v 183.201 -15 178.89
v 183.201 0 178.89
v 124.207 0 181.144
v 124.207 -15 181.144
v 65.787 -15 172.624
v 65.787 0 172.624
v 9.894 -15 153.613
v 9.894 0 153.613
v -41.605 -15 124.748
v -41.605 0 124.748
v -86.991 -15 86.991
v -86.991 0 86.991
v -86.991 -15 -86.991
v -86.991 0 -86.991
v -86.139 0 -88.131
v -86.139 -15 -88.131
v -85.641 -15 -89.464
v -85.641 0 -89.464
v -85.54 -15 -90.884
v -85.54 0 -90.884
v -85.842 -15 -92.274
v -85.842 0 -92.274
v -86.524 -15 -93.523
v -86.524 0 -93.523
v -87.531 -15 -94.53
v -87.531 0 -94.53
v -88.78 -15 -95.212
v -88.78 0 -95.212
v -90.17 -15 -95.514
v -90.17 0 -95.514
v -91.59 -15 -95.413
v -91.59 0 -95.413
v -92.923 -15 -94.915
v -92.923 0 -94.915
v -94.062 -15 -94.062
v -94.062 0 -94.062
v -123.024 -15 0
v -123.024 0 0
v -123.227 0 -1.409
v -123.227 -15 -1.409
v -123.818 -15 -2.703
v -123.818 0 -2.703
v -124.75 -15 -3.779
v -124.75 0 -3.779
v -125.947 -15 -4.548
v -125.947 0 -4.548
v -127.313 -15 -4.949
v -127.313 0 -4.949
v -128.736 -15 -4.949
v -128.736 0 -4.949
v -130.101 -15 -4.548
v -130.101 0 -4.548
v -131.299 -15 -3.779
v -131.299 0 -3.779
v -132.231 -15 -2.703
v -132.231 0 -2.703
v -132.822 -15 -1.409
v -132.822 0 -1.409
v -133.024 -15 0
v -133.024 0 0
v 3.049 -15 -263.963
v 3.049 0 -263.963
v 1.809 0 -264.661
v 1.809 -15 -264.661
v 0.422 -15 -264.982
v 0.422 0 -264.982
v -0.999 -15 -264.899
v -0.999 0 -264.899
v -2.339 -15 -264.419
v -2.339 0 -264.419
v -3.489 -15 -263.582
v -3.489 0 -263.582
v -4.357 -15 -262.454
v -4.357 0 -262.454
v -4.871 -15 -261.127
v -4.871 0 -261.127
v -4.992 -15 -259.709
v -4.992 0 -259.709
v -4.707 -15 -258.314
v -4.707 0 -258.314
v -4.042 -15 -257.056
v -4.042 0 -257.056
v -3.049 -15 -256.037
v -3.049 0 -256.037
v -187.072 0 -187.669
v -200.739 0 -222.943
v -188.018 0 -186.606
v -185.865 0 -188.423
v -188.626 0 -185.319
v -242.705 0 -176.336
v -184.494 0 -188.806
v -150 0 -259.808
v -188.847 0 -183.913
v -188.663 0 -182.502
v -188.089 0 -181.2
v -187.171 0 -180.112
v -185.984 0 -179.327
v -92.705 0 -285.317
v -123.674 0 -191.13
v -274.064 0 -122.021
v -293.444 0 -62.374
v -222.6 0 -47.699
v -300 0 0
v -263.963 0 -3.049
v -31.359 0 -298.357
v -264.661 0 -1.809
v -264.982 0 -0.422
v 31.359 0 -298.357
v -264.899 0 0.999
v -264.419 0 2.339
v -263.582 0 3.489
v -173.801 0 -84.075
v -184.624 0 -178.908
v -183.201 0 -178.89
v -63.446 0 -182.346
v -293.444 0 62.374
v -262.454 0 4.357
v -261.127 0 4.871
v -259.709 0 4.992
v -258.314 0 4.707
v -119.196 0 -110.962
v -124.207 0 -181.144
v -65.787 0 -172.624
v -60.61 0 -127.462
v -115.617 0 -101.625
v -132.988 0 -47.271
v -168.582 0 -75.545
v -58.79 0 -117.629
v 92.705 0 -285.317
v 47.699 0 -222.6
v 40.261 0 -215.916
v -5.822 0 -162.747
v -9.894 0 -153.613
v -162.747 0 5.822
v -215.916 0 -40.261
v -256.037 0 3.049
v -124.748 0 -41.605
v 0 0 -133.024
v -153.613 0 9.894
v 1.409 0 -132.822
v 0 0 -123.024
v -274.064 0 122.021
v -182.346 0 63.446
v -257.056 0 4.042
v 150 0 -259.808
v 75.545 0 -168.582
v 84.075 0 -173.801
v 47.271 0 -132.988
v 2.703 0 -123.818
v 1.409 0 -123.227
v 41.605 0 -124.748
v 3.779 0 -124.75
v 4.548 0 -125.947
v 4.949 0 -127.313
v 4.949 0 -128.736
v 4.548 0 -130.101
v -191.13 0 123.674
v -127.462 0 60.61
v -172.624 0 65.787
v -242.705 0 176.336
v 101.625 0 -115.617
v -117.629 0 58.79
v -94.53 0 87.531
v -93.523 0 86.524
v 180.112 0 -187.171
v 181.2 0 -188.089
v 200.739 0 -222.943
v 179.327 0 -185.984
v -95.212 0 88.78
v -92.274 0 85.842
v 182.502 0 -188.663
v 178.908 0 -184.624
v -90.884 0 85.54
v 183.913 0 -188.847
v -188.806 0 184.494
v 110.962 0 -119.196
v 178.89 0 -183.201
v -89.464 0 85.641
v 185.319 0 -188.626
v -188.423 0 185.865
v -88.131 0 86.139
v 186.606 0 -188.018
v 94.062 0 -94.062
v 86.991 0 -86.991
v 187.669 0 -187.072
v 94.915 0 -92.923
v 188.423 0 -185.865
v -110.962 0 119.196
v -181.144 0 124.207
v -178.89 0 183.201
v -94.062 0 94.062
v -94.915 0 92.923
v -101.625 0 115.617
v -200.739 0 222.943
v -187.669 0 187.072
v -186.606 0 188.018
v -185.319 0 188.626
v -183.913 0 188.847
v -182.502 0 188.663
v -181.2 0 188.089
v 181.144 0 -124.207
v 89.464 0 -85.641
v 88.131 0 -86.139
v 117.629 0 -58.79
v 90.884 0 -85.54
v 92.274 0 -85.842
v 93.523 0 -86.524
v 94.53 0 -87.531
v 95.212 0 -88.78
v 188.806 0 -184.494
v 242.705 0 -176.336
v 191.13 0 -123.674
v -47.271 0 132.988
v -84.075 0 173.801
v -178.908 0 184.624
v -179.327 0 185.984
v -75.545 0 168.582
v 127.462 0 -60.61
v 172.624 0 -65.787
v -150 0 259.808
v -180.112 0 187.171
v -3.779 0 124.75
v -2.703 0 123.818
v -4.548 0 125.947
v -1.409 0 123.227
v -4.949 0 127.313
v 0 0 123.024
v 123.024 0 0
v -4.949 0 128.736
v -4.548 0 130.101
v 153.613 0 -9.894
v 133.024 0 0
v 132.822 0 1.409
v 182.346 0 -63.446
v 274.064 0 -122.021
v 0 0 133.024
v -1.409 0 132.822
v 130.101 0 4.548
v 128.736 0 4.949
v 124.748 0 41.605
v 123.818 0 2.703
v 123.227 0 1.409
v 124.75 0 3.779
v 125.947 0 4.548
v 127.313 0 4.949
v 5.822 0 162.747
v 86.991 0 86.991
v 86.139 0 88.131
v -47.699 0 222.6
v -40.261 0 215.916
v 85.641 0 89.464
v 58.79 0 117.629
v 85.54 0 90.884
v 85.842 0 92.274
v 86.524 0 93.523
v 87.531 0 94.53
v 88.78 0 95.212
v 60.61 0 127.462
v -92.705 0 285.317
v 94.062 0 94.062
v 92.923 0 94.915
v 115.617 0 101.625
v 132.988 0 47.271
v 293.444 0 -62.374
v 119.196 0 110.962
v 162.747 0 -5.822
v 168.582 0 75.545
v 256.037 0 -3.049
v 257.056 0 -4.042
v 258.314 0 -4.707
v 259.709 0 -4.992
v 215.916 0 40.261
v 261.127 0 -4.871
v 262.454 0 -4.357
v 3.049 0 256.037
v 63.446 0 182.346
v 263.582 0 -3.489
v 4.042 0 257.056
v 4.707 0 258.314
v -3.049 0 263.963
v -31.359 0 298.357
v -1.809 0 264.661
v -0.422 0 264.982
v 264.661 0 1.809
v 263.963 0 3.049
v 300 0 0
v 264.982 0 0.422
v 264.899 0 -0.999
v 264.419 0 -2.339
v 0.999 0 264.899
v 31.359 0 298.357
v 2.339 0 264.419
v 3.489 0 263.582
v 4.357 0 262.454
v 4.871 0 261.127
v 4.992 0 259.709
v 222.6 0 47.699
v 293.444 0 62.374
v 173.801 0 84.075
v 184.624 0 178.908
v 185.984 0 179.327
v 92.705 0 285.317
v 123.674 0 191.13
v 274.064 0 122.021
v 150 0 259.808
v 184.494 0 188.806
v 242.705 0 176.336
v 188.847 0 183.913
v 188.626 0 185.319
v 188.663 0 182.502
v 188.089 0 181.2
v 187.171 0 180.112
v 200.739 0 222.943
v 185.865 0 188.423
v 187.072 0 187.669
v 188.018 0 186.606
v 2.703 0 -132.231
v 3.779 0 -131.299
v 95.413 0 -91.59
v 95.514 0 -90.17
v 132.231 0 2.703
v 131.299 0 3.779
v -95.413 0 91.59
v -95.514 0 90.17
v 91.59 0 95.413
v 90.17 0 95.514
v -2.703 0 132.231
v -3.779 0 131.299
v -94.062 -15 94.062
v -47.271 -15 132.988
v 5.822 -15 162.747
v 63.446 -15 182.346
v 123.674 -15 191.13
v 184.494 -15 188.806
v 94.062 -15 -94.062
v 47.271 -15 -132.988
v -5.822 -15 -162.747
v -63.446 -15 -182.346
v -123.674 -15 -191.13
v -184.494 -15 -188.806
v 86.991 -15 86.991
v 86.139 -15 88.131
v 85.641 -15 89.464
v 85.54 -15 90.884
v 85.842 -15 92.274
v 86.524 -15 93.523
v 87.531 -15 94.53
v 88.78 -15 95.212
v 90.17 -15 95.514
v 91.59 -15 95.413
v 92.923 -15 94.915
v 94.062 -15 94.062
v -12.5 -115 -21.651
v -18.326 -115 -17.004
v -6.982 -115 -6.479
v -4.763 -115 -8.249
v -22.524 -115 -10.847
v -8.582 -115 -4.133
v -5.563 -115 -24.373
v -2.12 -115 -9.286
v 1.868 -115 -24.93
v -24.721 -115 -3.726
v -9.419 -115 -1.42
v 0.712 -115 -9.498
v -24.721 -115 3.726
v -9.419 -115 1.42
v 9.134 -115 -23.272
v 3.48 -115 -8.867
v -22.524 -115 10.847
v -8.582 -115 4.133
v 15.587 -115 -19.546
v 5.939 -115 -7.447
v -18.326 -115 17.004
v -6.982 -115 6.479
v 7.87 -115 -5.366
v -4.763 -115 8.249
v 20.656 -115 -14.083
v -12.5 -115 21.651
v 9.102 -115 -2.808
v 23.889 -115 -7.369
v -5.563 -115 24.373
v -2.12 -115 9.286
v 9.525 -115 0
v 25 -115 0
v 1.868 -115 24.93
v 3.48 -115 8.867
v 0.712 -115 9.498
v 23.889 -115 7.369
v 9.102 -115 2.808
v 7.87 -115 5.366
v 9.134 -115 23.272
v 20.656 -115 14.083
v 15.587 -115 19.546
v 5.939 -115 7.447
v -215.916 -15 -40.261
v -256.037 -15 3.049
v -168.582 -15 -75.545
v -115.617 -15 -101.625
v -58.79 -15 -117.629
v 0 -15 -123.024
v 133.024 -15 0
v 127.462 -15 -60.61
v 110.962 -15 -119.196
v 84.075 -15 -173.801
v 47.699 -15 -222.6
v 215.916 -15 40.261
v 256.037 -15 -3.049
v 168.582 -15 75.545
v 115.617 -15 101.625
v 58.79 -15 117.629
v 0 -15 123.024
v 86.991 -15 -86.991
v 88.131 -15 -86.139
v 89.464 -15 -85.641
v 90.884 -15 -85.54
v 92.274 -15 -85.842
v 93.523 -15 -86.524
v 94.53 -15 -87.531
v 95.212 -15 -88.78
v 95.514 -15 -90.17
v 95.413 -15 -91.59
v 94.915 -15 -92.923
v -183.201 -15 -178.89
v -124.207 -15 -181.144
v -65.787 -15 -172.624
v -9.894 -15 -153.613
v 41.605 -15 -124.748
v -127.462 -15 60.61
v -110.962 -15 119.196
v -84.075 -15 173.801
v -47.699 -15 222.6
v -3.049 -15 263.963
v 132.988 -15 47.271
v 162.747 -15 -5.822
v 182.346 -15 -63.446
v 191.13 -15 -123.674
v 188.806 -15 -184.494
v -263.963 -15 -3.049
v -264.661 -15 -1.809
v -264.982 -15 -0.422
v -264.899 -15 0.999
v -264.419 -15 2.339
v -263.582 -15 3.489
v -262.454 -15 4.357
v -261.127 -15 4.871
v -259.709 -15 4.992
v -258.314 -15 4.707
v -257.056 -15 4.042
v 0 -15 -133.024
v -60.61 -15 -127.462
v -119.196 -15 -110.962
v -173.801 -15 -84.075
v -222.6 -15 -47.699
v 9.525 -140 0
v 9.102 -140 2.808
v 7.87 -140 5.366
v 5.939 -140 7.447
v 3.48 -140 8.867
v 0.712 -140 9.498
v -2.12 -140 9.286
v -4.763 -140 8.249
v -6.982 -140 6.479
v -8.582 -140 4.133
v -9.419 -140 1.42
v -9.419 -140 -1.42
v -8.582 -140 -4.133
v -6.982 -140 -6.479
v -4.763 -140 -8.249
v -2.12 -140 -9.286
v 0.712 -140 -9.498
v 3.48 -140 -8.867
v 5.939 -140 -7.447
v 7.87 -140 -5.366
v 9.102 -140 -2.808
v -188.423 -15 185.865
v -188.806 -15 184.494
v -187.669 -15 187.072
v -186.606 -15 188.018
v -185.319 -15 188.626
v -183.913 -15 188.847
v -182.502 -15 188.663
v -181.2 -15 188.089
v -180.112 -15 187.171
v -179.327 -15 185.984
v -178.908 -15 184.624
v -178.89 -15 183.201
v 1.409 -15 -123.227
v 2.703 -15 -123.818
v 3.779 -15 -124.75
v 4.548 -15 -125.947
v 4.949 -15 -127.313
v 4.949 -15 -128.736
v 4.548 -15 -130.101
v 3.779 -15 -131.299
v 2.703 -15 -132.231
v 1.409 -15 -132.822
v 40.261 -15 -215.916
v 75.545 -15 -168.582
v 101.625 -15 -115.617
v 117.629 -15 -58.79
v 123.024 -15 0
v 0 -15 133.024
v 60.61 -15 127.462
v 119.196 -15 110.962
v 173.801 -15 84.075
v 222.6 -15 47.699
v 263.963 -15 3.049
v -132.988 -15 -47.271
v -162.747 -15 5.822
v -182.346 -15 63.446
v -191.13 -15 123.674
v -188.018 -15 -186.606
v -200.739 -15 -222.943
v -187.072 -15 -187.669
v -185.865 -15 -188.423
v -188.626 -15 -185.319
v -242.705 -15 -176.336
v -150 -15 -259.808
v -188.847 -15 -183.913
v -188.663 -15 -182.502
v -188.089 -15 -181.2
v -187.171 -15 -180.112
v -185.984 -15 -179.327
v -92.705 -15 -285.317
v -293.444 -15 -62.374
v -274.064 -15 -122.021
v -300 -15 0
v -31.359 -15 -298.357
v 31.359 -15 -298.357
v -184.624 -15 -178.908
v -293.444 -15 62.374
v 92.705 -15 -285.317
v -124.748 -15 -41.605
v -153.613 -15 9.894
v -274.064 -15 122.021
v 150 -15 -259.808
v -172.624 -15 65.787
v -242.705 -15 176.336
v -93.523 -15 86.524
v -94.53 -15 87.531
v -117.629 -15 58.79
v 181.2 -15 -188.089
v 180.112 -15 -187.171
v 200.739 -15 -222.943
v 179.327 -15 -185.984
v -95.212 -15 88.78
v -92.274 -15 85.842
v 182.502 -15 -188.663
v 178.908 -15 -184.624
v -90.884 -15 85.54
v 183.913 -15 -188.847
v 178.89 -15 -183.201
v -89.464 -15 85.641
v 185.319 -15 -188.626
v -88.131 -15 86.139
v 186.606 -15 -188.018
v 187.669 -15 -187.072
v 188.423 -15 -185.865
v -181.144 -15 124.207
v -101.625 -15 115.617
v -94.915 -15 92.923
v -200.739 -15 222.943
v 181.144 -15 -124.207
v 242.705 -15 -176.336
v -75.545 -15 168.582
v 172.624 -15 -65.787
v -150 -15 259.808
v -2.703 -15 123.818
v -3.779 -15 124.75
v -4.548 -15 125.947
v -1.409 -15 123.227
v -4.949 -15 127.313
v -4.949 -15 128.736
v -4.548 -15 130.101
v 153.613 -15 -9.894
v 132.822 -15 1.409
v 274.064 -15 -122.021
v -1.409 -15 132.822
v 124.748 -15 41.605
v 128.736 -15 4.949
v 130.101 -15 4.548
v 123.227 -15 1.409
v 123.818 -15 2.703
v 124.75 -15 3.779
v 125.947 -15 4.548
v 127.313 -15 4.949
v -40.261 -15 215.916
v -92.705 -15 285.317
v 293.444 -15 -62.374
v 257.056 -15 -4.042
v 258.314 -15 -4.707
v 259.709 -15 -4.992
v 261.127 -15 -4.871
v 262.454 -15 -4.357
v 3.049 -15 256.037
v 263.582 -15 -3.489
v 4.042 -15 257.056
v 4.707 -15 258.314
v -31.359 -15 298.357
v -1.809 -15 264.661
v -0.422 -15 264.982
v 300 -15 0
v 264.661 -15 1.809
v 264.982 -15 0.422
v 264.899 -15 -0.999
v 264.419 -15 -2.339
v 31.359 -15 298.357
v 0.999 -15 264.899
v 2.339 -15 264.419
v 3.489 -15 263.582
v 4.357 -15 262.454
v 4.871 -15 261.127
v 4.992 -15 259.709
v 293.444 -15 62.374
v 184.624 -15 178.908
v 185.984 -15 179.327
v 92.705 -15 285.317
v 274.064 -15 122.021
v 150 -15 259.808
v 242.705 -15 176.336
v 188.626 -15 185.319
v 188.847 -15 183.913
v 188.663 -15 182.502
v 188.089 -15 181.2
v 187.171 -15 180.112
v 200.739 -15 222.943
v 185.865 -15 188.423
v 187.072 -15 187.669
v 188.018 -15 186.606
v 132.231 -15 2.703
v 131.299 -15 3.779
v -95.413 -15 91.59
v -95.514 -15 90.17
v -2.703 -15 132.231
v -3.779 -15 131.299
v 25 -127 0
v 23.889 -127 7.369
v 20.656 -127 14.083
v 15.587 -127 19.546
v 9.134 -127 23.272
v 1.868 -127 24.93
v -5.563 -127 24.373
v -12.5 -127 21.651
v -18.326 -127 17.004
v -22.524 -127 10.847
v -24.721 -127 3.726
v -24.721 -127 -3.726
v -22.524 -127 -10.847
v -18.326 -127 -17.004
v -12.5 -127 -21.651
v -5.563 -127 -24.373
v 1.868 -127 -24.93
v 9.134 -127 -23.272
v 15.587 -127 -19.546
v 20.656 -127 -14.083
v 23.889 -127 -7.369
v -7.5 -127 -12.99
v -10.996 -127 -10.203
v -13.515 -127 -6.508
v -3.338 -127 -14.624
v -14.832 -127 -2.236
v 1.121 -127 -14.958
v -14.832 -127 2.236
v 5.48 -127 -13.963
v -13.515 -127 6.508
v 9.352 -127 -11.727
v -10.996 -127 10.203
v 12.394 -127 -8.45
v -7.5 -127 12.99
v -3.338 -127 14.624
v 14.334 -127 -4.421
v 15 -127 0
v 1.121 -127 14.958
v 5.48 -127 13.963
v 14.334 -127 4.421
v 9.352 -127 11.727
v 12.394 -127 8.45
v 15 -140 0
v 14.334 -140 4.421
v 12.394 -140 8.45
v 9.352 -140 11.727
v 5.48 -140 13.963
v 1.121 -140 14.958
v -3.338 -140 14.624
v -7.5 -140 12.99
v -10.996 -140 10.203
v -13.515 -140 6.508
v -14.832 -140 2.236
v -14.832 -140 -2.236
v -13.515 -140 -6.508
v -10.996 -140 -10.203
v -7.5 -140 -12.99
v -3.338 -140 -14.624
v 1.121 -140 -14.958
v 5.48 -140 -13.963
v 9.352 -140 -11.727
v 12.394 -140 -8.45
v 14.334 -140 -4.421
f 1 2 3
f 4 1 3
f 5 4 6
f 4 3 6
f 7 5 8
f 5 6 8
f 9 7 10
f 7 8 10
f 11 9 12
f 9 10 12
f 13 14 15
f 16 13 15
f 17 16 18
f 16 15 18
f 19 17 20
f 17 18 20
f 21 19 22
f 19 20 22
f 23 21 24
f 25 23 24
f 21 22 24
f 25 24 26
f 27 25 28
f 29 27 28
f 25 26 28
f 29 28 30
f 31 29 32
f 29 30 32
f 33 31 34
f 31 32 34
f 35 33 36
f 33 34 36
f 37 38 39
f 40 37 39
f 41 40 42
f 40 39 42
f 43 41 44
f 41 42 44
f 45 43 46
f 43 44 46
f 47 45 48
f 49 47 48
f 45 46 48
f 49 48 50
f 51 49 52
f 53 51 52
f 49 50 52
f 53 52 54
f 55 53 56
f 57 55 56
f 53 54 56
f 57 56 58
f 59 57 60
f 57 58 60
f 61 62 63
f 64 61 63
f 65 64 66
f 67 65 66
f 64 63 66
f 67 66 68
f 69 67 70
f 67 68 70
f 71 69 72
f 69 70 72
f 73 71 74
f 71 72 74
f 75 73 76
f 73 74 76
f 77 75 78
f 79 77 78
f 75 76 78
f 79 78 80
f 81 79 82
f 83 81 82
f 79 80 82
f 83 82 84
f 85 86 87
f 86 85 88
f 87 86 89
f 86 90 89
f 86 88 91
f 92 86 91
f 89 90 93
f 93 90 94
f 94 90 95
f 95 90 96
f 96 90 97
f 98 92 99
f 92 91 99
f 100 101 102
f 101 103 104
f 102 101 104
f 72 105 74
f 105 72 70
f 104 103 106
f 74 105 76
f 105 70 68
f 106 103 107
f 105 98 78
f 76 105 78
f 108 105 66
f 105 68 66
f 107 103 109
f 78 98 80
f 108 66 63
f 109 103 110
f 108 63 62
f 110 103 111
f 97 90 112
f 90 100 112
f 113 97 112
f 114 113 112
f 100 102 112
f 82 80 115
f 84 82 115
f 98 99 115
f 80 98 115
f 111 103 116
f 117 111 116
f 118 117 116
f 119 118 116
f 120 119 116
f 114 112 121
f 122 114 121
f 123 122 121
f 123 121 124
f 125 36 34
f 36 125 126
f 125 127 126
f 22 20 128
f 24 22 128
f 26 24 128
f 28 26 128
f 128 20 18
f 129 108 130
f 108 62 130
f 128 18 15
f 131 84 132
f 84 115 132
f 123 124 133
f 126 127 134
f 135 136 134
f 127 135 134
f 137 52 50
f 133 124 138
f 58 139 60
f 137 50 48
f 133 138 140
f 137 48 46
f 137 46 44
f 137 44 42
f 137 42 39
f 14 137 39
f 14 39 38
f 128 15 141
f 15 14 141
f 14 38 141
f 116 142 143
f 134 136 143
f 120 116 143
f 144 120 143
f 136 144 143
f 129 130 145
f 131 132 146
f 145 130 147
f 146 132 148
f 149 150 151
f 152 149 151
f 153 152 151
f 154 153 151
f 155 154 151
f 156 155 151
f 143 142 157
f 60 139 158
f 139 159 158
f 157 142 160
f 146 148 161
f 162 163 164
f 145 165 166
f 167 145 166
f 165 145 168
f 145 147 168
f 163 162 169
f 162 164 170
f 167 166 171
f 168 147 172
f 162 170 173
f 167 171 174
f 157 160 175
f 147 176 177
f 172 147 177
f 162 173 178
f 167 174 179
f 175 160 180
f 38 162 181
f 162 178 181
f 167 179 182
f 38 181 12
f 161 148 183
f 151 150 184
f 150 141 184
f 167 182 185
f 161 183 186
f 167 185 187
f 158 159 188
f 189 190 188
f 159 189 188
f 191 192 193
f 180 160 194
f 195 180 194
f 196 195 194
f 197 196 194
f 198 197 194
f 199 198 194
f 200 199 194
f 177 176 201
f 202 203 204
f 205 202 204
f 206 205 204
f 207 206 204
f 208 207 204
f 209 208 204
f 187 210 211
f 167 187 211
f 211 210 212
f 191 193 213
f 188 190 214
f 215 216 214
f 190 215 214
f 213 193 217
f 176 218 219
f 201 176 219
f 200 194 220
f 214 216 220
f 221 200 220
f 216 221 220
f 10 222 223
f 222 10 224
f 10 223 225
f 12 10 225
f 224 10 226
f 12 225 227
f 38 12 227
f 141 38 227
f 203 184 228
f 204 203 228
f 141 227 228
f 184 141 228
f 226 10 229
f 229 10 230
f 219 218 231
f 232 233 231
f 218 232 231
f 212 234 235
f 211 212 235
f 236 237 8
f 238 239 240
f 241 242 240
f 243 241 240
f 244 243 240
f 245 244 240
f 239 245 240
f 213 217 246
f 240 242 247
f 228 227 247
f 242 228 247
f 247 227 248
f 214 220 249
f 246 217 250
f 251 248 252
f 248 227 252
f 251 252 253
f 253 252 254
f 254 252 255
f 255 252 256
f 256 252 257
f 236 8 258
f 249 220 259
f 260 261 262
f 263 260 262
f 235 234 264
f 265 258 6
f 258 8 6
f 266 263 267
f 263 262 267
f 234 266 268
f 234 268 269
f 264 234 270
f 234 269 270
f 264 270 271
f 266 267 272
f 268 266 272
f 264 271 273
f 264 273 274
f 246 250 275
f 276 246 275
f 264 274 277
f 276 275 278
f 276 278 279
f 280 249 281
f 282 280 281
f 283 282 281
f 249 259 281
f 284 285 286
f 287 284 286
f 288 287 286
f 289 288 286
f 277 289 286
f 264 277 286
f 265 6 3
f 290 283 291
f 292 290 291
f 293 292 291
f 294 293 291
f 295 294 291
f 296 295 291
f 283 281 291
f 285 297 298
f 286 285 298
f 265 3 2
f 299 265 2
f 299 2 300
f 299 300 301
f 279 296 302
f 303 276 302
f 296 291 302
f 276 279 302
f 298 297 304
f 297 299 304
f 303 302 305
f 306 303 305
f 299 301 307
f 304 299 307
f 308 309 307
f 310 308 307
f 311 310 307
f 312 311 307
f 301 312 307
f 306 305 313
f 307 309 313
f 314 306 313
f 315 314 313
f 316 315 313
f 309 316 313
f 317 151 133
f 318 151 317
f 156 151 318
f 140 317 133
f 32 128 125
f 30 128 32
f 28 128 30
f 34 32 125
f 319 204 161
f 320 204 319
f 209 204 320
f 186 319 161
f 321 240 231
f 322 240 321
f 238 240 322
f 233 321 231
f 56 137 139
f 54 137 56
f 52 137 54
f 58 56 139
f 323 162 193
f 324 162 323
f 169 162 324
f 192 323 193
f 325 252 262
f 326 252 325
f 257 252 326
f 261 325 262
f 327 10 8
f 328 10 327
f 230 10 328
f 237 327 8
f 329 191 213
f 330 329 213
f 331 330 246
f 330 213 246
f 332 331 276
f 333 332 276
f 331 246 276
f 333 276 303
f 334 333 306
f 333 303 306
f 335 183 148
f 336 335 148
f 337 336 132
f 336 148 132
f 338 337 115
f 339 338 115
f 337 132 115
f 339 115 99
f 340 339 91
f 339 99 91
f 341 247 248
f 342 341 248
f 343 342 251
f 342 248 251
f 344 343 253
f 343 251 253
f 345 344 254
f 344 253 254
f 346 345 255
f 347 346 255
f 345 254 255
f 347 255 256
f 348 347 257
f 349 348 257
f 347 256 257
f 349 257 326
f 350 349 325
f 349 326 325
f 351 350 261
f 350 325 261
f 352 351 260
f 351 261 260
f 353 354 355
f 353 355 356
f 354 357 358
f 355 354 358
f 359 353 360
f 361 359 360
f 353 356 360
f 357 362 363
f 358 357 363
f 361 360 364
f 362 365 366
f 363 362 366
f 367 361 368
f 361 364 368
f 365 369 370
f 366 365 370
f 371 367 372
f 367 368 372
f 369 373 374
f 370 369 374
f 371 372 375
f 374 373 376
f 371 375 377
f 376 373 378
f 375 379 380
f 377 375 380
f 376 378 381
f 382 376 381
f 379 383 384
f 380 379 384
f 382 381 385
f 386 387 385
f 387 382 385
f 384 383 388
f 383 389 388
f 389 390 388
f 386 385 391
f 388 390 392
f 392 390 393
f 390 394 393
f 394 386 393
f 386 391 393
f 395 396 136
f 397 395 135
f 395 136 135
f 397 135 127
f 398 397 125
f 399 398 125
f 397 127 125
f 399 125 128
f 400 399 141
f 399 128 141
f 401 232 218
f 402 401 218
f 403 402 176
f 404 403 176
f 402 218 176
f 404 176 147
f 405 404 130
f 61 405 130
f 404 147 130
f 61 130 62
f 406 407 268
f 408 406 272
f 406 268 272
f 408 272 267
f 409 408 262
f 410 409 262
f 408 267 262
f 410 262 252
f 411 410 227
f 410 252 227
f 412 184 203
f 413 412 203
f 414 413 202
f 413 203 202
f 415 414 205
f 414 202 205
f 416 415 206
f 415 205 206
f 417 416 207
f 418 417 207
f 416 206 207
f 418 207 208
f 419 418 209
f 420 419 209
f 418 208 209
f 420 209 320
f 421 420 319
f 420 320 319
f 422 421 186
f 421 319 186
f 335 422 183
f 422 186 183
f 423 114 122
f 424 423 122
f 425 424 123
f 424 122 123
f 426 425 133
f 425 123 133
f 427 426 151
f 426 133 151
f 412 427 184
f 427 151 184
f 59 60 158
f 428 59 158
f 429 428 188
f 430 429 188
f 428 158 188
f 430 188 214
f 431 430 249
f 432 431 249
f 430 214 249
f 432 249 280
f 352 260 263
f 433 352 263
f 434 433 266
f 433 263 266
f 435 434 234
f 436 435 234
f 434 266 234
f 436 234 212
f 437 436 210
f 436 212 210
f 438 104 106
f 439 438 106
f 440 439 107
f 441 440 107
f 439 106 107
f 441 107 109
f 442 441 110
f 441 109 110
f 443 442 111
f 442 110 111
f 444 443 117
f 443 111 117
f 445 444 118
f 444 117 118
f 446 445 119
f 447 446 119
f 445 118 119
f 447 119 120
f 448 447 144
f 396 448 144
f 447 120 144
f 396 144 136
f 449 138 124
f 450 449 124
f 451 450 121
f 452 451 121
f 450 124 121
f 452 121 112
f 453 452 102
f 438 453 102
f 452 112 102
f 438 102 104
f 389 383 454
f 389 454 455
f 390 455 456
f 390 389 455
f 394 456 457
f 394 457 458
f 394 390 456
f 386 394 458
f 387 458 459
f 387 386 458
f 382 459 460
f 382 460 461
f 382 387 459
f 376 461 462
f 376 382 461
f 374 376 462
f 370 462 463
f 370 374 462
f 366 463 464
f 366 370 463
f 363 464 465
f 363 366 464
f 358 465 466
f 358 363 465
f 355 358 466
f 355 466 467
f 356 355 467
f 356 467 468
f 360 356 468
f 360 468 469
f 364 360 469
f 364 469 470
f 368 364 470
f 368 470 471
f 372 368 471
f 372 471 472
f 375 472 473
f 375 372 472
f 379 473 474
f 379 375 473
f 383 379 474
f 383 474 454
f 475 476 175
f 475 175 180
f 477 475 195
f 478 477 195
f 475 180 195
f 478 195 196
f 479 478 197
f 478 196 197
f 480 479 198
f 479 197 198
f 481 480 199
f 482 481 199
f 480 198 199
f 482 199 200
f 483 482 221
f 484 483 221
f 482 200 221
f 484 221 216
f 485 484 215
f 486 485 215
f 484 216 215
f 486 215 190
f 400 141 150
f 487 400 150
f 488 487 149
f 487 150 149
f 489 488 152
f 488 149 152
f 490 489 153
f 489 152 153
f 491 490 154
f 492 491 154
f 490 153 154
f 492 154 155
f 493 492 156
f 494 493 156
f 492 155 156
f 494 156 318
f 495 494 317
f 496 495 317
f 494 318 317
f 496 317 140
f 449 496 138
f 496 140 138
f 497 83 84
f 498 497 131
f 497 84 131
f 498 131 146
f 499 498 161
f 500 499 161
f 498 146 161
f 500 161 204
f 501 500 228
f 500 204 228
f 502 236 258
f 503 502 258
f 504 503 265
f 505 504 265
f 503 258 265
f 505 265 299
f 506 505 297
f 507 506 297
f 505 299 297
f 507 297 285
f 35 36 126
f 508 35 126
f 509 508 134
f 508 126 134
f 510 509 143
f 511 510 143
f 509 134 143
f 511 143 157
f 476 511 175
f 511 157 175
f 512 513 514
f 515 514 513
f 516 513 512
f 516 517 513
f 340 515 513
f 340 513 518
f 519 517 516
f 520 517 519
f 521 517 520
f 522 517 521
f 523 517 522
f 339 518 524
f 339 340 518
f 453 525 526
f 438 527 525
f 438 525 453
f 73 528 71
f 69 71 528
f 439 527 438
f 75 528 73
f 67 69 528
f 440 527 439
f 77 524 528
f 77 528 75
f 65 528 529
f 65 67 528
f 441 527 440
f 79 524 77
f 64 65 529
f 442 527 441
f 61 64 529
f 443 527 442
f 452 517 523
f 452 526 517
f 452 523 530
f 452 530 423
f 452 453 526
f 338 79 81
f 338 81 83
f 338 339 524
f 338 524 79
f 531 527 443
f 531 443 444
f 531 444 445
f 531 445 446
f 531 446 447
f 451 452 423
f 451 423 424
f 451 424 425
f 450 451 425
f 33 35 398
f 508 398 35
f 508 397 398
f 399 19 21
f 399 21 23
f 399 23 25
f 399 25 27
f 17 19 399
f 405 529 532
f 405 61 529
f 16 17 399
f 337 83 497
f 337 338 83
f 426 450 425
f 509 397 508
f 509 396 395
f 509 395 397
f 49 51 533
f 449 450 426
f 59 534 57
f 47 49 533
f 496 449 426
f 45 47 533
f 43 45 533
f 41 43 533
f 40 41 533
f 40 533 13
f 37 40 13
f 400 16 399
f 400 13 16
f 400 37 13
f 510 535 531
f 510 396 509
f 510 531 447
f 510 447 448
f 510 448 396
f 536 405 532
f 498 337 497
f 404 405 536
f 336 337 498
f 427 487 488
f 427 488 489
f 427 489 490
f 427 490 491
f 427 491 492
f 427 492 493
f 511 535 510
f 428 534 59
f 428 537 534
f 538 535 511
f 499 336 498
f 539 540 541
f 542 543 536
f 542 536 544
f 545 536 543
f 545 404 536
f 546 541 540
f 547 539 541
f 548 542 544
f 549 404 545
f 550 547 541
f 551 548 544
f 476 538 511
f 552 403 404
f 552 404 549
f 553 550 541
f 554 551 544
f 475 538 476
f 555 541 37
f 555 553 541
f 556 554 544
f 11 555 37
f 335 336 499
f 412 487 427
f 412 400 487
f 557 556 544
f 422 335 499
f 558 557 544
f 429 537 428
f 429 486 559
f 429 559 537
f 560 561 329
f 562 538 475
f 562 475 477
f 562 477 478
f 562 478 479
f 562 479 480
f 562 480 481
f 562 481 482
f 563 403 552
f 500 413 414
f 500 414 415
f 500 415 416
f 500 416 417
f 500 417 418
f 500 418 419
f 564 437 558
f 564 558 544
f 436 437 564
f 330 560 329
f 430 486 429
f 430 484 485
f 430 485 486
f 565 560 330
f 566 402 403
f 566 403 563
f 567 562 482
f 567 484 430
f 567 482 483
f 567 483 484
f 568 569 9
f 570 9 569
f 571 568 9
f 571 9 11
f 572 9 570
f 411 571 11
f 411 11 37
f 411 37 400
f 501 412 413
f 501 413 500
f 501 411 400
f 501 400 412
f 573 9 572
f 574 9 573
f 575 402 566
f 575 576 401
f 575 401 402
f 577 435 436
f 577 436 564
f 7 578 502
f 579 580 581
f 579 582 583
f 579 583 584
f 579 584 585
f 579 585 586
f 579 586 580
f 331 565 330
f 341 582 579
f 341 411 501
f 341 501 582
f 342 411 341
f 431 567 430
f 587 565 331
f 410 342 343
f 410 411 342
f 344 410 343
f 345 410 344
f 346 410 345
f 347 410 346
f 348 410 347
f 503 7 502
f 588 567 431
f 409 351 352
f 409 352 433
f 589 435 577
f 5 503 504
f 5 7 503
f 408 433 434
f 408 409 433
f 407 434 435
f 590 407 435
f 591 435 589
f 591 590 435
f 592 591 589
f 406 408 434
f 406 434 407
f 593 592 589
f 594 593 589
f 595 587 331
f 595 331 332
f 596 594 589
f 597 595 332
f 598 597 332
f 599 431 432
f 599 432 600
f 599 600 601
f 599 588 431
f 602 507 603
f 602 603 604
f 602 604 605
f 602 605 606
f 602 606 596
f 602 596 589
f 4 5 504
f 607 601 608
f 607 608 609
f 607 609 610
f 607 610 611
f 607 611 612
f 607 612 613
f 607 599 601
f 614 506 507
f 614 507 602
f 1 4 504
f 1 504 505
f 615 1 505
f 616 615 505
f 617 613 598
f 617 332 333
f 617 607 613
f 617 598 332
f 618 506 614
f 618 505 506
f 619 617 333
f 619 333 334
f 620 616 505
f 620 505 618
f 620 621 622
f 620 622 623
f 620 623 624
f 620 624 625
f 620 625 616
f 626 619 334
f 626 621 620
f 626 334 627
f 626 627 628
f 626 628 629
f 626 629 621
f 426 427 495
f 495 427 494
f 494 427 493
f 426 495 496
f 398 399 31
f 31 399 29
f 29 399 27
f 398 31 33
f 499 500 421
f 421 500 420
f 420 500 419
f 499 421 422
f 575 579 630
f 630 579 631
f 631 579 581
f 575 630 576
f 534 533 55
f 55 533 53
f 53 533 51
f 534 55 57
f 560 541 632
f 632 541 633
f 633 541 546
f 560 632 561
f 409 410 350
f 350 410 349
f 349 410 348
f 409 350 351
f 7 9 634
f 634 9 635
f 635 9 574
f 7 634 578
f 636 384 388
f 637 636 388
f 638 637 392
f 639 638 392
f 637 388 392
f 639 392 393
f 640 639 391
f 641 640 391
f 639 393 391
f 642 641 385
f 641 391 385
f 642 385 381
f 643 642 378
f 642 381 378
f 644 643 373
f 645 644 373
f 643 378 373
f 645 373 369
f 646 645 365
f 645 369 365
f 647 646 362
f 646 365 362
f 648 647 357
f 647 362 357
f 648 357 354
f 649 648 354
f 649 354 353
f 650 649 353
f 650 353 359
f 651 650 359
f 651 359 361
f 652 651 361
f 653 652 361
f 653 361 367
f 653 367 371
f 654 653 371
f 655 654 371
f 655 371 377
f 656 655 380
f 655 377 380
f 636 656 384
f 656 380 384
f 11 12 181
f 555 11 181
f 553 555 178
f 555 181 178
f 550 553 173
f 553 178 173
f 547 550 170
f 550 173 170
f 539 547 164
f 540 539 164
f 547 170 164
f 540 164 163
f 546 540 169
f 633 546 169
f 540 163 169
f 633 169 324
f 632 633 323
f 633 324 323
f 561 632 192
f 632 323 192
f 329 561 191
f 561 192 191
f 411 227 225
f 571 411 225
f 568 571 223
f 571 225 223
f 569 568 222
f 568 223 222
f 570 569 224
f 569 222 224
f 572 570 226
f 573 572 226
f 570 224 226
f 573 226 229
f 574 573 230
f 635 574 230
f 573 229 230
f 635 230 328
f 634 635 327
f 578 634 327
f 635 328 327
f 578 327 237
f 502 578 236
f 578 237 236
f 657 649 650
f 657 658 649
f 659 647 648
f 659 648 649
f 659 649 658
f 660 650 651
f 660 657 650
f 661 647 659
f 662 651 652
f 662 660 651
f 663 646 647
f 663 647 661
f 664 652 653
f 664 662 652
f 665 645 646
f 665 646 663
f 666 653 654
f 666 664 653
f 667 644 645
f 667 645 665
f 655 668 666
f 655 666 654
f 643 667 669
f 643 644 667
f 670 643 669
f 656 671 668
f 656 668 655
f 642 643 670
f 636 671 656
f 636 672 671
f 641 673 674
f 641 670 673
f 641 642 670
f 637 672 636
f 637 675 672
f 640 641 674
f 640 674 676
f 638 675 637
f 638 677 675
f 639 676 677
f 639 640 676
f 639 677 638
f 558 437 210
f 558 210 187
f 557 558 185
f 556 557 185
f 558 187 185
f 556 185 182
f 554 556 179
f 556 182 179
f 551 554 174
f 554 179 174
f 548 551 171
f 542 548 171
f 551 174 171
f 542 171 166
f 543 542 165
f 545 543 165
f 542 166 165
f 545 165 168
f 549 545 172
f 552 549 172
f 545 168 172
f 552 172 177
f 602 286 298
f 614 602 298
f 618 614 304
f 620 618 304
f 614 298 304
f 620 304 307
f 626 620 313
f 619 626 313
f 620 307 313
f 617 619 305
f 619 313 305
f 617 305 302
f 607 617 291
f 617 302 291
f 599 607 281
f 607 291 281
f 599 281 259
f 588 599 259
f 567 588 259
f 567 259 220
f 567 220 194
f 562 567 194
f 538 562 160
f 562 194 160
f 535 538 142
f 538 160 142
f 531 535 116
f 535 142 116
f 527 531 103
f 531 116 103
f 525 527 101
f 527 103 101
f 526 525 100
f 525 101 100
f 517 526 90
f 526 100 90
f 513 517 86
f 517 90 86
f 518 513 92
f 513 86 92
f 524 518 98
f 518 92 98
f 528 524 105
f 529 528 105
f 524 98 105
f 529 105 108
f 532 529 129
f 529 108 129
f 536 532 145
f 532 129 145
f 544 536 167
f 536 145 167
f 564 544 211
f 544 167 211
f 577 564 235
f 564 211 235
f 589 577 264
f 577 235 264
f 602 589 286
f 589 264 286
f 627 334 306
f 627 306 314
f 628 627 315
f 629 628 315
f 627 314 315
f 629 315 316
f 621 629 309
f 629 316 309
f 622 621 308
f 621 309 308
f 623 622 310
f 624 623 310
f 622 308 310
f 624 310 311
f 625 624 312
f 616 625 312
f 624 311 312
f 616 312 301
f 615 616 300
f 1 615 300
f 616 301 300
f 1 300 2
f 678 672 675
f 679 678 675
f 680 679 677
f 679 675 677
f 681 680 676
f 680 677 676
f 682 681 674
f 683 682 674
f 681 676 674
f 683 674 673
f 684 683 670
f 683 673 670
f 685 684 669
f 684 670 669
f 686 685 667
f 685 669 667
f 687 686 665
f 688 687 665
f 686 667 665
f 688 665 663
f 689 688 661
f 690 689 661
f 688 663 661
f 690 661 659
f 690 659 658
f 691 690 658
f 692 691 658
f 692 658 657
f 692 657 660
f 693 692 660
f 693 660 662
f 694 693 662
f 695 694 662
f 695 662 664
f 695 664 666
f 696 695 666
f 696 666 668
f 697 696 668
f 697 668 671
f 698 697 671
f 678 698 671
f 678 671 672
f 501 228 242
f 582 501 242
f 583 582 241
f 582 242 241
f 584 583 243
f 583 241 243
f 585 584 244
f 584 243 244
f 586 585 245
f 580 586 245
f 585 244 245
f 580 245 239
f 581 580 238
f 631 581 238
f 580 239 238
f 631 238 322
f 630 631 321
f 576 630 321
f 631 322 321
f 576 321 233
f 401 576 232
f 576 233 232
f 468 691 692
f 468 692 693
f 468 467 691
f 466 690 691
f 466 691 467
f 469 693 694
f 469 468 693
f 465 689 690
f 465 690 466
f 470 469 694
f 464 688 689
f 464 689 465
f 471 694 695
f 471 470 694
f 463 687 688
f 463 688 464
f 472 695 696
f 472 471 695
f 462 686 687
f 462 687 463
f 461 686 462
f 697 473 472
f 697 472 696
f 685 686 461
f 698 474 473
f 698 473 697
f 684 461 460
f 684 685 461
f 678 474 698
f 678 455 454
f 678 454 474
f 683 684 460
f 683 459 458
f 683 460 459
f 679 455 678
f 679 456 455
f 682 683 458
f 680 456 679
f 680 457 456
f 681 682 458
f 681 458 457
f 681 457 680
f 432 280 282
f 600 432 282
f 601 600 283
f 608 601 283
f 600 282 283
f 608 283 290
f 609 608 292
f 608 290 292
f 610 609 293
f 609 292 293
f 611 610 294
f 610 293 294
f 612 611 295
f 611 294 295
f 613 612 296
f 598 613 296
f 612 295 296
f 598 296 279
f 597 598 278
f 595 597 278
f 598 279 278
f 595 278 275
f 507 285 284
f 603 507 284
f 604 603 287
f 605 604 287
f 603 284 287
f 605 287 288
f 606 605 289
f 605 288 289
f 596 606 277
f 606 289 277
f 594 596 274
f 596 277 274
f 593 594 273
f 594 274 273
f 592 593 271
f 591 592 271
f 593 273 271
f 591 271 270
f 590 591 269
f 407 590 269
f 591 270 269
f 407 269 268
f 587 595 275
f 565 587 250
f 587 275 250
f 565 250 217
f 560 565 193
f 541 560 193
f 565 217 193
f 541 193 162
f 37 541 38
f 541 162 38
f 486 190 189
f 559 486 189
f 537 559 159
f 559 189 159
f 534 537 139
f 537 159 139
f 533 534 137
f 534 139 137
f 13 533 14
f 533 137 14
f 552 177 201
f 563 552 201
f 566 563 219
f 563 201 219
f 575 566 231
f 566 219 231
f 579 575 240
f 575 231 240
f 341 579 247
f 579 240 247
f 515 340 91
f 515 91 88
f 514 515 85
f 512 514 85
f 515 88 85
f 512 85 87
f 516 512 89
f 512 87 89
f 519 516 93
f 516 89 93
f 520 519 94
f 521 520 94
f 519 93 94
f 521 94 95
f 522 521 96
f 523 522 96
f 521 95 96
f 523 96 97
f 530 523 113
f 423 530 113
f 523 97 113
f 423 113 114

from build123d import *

# Parameters (mm, degrees)
F0_R     = 300
F1_DEPTH = 15
F3_R     = 15
F3_R_2   = 9.525
F4_DEPTH = 25
F3_R_3   = 25
F5_DEPTH = 12


with BuildPart() as f1:
    # F0 (on Front) → F1 (new body)
    with BuildSketch(Plane.XZ):
        Circle(F0_R)
        with BuildLine():
            ThreePointArc((94.0624477635, -94.0624477635), (-34.1854315992, -173.8653392644), (-184.4944590288, -188.8057651644))
            ThreePointArc((-184.4944590288, -188.8057651644), (-188.8057651644, -183.2010671882), (-183.2010671882, -178.8897610526))
            ThreePointArc((-183.2010671882, -178.8897610526), (-37.405493795, -164.3979637328), (86.9913799516, -86.9913799516))
            ThreePointArc((86.9913799516, -86.9913799516), (94.0624477635, -86.9913799516), (94.0624477635, -94.0624477635))
        make_face(mode=Mode.SUBTRACT)
        with BuildLine():
            ThreePointArc((0, -133.0243893371), (-147.1141109087, -98.7686099056), (-263.9631199455, -3.0485538042))
            ThreePointArc((-263.9631199455, -3.0485538042), (-263.0485538042, 3.9631199455), (-256.0368800545, 3.0485538042))
            ThreePointArc((-256.0368800545, 3.0485538042), (-142.6965932848, -89.7972366527), (0, -123.0243893371))
            ThreePointArc((0, -123.0243893371), (5, -128.0243893371), (0, -133.0243893371))
        make_face(mode=Mode.SUBTRACT)
        with BuildLine():
            ThreePointArc((133.0243893371, 0), (98.7686099056, -147.1141109087), (3.0485538042, -263.9631199455))
            ThreePointArc((3.0485538042, -263.9631199455), (-3.9631199455, -263.0485538042), (-3.0485538042, -256.0368800545))
            ThreePointArc((-3.0485538042, -256.0368800545), (89.7972366527, -142.6965932848), (123.0243893371, 0))
            ThreePointArc((123.0243893371, 0), (128.0243893371, 5), (133.0243893371, 0))
        make_face(mode=Mode.SUBTRACT)
        with BuildLine():
            ThreePointArc((94.0624477635, 94.0624477635), (173.8653392644, -34.1854315992), (188.8057651644, -184.4944590288))
            ThreePointArc((188.8057651644, -184.4944590288), (183.2010671882, -188.8057651644), (178.8897610526, -183.2010671882))
            ThreePointArc((178.8897610526, -183.2010671882), (164.3979637328, -37.405493795), (86.9913799516, 86.9913799516))
            ThreePointArc((86.9913799516, 86.9913799516), (86.9913799516, 94.0624477635), (94.0624477635, 94.0624477635))
        make_face(mode=Mode.SUBTRACT)
        with BuildLine():
            ThreePointArc((-94.0624477635, -94.0624477635), (-173.8653392644, 34.1854315992), (-188.8057651644, 184.4944590288))
            ThreePointArc((-188.8057651644, 184.4944590288), (-183.2010671882, 188.8057651644), (-178.8897610526, 183.2010671882))
            ThreePointArc((-178.8897610526, 183.2010671882), (-164.3979637328, 37.405493795), (-86.9913799516, -86.9913799516))
            ThreePointArc((-86.9913799516, -86.9913799516), (-86.9913799516, -94.0624477635), (-94.0624477635, -94.0624477635))
        make_face(mode=Mode.SUBTRACT)
        with BuildLine():
            ThreePointArc((-133.0243893371, 0), (-98.7686099056, 147.1141109087), (-3.0485538042, 263.9631199455))
            ThreePointArc((-3.0485538042, 263.9631199455), (3.9631199455, 263.0485538042), (3.0485538042, 256.0368800545))
            ThreePointArc((3.0485538042, 256.0368800545), (-89.7972366527, 142.6965932848), (-123.0243893371, 0))
            ThreePointArc((-123.0243893371, 0), (-128.0243893371, -5), (-133.0243893371, 0))
        make_face(mode=Mode.SUBTRACT)
        with BuildLine():
            ThreePointArc((0, 133.0243893371), (147.1141109087, 98.7686099056), (263.9631199455, 3.0485538042))
            ThreePointArc((263.9631199455, 3.0485538042), (263.0485538042, -3.9631199455), (256.0368800545, -3.0485538042))
            ThreePointArc((256.0368800545, -3.0485538042), (142.6965932848, 89.7972366527), (0, 123.0243893371))
            ThreePointArc((0, 123.0243893371), (-5, 128.0243893371), (0, 133.0243893371))
        make_face(mode=Mode.SUBTRACT)
        with BuildLine():
            ThreePointArc((-94.0624477635, 94.0624477635), (34.1854315992, 173.8653392644), (184.4944590288, 188.8057651644))
            ThreePointArc((184.4944590288, 188.8057651644), (188.8057651644, 183.2010671882), (183.2010671882, 178.8897610526))
            ThreePointArc((183.2010671882, 178.8897610526), (37.405493795, 164.3979637328), (-86.9913799516, 86.9913799516))
            ThreePointArc((-86.9913799516, 86.9913799516), (-94.0624477635, 86.9913799516), (-94.0624477635, 94.0624477635))
        make_face(mode=Mode.SUBTRACT)
    extrude(amount=F1_DEPTH)


with BuildPart() as f4:
    # F3 (on offset) → F4 (new body)
    with BuildSketch(Plane.XZ.offset(115)):
        Circle(F3_R)
        Circle(F3_R_2, mode=Mode.SUBTRACT)
    extrude(amount=F4_DEPTH)

    # F3 (on offset) → F5 (join)
    with BuildSketch(Plane.XZ.offset(115)):
        Circle(F3_R_3)
        Circle(F3_R, mode=Mode.SUBTRACT)
    extrude(amount=F5_DEPTH)


solid = Compound([f1.part, f4.part])
